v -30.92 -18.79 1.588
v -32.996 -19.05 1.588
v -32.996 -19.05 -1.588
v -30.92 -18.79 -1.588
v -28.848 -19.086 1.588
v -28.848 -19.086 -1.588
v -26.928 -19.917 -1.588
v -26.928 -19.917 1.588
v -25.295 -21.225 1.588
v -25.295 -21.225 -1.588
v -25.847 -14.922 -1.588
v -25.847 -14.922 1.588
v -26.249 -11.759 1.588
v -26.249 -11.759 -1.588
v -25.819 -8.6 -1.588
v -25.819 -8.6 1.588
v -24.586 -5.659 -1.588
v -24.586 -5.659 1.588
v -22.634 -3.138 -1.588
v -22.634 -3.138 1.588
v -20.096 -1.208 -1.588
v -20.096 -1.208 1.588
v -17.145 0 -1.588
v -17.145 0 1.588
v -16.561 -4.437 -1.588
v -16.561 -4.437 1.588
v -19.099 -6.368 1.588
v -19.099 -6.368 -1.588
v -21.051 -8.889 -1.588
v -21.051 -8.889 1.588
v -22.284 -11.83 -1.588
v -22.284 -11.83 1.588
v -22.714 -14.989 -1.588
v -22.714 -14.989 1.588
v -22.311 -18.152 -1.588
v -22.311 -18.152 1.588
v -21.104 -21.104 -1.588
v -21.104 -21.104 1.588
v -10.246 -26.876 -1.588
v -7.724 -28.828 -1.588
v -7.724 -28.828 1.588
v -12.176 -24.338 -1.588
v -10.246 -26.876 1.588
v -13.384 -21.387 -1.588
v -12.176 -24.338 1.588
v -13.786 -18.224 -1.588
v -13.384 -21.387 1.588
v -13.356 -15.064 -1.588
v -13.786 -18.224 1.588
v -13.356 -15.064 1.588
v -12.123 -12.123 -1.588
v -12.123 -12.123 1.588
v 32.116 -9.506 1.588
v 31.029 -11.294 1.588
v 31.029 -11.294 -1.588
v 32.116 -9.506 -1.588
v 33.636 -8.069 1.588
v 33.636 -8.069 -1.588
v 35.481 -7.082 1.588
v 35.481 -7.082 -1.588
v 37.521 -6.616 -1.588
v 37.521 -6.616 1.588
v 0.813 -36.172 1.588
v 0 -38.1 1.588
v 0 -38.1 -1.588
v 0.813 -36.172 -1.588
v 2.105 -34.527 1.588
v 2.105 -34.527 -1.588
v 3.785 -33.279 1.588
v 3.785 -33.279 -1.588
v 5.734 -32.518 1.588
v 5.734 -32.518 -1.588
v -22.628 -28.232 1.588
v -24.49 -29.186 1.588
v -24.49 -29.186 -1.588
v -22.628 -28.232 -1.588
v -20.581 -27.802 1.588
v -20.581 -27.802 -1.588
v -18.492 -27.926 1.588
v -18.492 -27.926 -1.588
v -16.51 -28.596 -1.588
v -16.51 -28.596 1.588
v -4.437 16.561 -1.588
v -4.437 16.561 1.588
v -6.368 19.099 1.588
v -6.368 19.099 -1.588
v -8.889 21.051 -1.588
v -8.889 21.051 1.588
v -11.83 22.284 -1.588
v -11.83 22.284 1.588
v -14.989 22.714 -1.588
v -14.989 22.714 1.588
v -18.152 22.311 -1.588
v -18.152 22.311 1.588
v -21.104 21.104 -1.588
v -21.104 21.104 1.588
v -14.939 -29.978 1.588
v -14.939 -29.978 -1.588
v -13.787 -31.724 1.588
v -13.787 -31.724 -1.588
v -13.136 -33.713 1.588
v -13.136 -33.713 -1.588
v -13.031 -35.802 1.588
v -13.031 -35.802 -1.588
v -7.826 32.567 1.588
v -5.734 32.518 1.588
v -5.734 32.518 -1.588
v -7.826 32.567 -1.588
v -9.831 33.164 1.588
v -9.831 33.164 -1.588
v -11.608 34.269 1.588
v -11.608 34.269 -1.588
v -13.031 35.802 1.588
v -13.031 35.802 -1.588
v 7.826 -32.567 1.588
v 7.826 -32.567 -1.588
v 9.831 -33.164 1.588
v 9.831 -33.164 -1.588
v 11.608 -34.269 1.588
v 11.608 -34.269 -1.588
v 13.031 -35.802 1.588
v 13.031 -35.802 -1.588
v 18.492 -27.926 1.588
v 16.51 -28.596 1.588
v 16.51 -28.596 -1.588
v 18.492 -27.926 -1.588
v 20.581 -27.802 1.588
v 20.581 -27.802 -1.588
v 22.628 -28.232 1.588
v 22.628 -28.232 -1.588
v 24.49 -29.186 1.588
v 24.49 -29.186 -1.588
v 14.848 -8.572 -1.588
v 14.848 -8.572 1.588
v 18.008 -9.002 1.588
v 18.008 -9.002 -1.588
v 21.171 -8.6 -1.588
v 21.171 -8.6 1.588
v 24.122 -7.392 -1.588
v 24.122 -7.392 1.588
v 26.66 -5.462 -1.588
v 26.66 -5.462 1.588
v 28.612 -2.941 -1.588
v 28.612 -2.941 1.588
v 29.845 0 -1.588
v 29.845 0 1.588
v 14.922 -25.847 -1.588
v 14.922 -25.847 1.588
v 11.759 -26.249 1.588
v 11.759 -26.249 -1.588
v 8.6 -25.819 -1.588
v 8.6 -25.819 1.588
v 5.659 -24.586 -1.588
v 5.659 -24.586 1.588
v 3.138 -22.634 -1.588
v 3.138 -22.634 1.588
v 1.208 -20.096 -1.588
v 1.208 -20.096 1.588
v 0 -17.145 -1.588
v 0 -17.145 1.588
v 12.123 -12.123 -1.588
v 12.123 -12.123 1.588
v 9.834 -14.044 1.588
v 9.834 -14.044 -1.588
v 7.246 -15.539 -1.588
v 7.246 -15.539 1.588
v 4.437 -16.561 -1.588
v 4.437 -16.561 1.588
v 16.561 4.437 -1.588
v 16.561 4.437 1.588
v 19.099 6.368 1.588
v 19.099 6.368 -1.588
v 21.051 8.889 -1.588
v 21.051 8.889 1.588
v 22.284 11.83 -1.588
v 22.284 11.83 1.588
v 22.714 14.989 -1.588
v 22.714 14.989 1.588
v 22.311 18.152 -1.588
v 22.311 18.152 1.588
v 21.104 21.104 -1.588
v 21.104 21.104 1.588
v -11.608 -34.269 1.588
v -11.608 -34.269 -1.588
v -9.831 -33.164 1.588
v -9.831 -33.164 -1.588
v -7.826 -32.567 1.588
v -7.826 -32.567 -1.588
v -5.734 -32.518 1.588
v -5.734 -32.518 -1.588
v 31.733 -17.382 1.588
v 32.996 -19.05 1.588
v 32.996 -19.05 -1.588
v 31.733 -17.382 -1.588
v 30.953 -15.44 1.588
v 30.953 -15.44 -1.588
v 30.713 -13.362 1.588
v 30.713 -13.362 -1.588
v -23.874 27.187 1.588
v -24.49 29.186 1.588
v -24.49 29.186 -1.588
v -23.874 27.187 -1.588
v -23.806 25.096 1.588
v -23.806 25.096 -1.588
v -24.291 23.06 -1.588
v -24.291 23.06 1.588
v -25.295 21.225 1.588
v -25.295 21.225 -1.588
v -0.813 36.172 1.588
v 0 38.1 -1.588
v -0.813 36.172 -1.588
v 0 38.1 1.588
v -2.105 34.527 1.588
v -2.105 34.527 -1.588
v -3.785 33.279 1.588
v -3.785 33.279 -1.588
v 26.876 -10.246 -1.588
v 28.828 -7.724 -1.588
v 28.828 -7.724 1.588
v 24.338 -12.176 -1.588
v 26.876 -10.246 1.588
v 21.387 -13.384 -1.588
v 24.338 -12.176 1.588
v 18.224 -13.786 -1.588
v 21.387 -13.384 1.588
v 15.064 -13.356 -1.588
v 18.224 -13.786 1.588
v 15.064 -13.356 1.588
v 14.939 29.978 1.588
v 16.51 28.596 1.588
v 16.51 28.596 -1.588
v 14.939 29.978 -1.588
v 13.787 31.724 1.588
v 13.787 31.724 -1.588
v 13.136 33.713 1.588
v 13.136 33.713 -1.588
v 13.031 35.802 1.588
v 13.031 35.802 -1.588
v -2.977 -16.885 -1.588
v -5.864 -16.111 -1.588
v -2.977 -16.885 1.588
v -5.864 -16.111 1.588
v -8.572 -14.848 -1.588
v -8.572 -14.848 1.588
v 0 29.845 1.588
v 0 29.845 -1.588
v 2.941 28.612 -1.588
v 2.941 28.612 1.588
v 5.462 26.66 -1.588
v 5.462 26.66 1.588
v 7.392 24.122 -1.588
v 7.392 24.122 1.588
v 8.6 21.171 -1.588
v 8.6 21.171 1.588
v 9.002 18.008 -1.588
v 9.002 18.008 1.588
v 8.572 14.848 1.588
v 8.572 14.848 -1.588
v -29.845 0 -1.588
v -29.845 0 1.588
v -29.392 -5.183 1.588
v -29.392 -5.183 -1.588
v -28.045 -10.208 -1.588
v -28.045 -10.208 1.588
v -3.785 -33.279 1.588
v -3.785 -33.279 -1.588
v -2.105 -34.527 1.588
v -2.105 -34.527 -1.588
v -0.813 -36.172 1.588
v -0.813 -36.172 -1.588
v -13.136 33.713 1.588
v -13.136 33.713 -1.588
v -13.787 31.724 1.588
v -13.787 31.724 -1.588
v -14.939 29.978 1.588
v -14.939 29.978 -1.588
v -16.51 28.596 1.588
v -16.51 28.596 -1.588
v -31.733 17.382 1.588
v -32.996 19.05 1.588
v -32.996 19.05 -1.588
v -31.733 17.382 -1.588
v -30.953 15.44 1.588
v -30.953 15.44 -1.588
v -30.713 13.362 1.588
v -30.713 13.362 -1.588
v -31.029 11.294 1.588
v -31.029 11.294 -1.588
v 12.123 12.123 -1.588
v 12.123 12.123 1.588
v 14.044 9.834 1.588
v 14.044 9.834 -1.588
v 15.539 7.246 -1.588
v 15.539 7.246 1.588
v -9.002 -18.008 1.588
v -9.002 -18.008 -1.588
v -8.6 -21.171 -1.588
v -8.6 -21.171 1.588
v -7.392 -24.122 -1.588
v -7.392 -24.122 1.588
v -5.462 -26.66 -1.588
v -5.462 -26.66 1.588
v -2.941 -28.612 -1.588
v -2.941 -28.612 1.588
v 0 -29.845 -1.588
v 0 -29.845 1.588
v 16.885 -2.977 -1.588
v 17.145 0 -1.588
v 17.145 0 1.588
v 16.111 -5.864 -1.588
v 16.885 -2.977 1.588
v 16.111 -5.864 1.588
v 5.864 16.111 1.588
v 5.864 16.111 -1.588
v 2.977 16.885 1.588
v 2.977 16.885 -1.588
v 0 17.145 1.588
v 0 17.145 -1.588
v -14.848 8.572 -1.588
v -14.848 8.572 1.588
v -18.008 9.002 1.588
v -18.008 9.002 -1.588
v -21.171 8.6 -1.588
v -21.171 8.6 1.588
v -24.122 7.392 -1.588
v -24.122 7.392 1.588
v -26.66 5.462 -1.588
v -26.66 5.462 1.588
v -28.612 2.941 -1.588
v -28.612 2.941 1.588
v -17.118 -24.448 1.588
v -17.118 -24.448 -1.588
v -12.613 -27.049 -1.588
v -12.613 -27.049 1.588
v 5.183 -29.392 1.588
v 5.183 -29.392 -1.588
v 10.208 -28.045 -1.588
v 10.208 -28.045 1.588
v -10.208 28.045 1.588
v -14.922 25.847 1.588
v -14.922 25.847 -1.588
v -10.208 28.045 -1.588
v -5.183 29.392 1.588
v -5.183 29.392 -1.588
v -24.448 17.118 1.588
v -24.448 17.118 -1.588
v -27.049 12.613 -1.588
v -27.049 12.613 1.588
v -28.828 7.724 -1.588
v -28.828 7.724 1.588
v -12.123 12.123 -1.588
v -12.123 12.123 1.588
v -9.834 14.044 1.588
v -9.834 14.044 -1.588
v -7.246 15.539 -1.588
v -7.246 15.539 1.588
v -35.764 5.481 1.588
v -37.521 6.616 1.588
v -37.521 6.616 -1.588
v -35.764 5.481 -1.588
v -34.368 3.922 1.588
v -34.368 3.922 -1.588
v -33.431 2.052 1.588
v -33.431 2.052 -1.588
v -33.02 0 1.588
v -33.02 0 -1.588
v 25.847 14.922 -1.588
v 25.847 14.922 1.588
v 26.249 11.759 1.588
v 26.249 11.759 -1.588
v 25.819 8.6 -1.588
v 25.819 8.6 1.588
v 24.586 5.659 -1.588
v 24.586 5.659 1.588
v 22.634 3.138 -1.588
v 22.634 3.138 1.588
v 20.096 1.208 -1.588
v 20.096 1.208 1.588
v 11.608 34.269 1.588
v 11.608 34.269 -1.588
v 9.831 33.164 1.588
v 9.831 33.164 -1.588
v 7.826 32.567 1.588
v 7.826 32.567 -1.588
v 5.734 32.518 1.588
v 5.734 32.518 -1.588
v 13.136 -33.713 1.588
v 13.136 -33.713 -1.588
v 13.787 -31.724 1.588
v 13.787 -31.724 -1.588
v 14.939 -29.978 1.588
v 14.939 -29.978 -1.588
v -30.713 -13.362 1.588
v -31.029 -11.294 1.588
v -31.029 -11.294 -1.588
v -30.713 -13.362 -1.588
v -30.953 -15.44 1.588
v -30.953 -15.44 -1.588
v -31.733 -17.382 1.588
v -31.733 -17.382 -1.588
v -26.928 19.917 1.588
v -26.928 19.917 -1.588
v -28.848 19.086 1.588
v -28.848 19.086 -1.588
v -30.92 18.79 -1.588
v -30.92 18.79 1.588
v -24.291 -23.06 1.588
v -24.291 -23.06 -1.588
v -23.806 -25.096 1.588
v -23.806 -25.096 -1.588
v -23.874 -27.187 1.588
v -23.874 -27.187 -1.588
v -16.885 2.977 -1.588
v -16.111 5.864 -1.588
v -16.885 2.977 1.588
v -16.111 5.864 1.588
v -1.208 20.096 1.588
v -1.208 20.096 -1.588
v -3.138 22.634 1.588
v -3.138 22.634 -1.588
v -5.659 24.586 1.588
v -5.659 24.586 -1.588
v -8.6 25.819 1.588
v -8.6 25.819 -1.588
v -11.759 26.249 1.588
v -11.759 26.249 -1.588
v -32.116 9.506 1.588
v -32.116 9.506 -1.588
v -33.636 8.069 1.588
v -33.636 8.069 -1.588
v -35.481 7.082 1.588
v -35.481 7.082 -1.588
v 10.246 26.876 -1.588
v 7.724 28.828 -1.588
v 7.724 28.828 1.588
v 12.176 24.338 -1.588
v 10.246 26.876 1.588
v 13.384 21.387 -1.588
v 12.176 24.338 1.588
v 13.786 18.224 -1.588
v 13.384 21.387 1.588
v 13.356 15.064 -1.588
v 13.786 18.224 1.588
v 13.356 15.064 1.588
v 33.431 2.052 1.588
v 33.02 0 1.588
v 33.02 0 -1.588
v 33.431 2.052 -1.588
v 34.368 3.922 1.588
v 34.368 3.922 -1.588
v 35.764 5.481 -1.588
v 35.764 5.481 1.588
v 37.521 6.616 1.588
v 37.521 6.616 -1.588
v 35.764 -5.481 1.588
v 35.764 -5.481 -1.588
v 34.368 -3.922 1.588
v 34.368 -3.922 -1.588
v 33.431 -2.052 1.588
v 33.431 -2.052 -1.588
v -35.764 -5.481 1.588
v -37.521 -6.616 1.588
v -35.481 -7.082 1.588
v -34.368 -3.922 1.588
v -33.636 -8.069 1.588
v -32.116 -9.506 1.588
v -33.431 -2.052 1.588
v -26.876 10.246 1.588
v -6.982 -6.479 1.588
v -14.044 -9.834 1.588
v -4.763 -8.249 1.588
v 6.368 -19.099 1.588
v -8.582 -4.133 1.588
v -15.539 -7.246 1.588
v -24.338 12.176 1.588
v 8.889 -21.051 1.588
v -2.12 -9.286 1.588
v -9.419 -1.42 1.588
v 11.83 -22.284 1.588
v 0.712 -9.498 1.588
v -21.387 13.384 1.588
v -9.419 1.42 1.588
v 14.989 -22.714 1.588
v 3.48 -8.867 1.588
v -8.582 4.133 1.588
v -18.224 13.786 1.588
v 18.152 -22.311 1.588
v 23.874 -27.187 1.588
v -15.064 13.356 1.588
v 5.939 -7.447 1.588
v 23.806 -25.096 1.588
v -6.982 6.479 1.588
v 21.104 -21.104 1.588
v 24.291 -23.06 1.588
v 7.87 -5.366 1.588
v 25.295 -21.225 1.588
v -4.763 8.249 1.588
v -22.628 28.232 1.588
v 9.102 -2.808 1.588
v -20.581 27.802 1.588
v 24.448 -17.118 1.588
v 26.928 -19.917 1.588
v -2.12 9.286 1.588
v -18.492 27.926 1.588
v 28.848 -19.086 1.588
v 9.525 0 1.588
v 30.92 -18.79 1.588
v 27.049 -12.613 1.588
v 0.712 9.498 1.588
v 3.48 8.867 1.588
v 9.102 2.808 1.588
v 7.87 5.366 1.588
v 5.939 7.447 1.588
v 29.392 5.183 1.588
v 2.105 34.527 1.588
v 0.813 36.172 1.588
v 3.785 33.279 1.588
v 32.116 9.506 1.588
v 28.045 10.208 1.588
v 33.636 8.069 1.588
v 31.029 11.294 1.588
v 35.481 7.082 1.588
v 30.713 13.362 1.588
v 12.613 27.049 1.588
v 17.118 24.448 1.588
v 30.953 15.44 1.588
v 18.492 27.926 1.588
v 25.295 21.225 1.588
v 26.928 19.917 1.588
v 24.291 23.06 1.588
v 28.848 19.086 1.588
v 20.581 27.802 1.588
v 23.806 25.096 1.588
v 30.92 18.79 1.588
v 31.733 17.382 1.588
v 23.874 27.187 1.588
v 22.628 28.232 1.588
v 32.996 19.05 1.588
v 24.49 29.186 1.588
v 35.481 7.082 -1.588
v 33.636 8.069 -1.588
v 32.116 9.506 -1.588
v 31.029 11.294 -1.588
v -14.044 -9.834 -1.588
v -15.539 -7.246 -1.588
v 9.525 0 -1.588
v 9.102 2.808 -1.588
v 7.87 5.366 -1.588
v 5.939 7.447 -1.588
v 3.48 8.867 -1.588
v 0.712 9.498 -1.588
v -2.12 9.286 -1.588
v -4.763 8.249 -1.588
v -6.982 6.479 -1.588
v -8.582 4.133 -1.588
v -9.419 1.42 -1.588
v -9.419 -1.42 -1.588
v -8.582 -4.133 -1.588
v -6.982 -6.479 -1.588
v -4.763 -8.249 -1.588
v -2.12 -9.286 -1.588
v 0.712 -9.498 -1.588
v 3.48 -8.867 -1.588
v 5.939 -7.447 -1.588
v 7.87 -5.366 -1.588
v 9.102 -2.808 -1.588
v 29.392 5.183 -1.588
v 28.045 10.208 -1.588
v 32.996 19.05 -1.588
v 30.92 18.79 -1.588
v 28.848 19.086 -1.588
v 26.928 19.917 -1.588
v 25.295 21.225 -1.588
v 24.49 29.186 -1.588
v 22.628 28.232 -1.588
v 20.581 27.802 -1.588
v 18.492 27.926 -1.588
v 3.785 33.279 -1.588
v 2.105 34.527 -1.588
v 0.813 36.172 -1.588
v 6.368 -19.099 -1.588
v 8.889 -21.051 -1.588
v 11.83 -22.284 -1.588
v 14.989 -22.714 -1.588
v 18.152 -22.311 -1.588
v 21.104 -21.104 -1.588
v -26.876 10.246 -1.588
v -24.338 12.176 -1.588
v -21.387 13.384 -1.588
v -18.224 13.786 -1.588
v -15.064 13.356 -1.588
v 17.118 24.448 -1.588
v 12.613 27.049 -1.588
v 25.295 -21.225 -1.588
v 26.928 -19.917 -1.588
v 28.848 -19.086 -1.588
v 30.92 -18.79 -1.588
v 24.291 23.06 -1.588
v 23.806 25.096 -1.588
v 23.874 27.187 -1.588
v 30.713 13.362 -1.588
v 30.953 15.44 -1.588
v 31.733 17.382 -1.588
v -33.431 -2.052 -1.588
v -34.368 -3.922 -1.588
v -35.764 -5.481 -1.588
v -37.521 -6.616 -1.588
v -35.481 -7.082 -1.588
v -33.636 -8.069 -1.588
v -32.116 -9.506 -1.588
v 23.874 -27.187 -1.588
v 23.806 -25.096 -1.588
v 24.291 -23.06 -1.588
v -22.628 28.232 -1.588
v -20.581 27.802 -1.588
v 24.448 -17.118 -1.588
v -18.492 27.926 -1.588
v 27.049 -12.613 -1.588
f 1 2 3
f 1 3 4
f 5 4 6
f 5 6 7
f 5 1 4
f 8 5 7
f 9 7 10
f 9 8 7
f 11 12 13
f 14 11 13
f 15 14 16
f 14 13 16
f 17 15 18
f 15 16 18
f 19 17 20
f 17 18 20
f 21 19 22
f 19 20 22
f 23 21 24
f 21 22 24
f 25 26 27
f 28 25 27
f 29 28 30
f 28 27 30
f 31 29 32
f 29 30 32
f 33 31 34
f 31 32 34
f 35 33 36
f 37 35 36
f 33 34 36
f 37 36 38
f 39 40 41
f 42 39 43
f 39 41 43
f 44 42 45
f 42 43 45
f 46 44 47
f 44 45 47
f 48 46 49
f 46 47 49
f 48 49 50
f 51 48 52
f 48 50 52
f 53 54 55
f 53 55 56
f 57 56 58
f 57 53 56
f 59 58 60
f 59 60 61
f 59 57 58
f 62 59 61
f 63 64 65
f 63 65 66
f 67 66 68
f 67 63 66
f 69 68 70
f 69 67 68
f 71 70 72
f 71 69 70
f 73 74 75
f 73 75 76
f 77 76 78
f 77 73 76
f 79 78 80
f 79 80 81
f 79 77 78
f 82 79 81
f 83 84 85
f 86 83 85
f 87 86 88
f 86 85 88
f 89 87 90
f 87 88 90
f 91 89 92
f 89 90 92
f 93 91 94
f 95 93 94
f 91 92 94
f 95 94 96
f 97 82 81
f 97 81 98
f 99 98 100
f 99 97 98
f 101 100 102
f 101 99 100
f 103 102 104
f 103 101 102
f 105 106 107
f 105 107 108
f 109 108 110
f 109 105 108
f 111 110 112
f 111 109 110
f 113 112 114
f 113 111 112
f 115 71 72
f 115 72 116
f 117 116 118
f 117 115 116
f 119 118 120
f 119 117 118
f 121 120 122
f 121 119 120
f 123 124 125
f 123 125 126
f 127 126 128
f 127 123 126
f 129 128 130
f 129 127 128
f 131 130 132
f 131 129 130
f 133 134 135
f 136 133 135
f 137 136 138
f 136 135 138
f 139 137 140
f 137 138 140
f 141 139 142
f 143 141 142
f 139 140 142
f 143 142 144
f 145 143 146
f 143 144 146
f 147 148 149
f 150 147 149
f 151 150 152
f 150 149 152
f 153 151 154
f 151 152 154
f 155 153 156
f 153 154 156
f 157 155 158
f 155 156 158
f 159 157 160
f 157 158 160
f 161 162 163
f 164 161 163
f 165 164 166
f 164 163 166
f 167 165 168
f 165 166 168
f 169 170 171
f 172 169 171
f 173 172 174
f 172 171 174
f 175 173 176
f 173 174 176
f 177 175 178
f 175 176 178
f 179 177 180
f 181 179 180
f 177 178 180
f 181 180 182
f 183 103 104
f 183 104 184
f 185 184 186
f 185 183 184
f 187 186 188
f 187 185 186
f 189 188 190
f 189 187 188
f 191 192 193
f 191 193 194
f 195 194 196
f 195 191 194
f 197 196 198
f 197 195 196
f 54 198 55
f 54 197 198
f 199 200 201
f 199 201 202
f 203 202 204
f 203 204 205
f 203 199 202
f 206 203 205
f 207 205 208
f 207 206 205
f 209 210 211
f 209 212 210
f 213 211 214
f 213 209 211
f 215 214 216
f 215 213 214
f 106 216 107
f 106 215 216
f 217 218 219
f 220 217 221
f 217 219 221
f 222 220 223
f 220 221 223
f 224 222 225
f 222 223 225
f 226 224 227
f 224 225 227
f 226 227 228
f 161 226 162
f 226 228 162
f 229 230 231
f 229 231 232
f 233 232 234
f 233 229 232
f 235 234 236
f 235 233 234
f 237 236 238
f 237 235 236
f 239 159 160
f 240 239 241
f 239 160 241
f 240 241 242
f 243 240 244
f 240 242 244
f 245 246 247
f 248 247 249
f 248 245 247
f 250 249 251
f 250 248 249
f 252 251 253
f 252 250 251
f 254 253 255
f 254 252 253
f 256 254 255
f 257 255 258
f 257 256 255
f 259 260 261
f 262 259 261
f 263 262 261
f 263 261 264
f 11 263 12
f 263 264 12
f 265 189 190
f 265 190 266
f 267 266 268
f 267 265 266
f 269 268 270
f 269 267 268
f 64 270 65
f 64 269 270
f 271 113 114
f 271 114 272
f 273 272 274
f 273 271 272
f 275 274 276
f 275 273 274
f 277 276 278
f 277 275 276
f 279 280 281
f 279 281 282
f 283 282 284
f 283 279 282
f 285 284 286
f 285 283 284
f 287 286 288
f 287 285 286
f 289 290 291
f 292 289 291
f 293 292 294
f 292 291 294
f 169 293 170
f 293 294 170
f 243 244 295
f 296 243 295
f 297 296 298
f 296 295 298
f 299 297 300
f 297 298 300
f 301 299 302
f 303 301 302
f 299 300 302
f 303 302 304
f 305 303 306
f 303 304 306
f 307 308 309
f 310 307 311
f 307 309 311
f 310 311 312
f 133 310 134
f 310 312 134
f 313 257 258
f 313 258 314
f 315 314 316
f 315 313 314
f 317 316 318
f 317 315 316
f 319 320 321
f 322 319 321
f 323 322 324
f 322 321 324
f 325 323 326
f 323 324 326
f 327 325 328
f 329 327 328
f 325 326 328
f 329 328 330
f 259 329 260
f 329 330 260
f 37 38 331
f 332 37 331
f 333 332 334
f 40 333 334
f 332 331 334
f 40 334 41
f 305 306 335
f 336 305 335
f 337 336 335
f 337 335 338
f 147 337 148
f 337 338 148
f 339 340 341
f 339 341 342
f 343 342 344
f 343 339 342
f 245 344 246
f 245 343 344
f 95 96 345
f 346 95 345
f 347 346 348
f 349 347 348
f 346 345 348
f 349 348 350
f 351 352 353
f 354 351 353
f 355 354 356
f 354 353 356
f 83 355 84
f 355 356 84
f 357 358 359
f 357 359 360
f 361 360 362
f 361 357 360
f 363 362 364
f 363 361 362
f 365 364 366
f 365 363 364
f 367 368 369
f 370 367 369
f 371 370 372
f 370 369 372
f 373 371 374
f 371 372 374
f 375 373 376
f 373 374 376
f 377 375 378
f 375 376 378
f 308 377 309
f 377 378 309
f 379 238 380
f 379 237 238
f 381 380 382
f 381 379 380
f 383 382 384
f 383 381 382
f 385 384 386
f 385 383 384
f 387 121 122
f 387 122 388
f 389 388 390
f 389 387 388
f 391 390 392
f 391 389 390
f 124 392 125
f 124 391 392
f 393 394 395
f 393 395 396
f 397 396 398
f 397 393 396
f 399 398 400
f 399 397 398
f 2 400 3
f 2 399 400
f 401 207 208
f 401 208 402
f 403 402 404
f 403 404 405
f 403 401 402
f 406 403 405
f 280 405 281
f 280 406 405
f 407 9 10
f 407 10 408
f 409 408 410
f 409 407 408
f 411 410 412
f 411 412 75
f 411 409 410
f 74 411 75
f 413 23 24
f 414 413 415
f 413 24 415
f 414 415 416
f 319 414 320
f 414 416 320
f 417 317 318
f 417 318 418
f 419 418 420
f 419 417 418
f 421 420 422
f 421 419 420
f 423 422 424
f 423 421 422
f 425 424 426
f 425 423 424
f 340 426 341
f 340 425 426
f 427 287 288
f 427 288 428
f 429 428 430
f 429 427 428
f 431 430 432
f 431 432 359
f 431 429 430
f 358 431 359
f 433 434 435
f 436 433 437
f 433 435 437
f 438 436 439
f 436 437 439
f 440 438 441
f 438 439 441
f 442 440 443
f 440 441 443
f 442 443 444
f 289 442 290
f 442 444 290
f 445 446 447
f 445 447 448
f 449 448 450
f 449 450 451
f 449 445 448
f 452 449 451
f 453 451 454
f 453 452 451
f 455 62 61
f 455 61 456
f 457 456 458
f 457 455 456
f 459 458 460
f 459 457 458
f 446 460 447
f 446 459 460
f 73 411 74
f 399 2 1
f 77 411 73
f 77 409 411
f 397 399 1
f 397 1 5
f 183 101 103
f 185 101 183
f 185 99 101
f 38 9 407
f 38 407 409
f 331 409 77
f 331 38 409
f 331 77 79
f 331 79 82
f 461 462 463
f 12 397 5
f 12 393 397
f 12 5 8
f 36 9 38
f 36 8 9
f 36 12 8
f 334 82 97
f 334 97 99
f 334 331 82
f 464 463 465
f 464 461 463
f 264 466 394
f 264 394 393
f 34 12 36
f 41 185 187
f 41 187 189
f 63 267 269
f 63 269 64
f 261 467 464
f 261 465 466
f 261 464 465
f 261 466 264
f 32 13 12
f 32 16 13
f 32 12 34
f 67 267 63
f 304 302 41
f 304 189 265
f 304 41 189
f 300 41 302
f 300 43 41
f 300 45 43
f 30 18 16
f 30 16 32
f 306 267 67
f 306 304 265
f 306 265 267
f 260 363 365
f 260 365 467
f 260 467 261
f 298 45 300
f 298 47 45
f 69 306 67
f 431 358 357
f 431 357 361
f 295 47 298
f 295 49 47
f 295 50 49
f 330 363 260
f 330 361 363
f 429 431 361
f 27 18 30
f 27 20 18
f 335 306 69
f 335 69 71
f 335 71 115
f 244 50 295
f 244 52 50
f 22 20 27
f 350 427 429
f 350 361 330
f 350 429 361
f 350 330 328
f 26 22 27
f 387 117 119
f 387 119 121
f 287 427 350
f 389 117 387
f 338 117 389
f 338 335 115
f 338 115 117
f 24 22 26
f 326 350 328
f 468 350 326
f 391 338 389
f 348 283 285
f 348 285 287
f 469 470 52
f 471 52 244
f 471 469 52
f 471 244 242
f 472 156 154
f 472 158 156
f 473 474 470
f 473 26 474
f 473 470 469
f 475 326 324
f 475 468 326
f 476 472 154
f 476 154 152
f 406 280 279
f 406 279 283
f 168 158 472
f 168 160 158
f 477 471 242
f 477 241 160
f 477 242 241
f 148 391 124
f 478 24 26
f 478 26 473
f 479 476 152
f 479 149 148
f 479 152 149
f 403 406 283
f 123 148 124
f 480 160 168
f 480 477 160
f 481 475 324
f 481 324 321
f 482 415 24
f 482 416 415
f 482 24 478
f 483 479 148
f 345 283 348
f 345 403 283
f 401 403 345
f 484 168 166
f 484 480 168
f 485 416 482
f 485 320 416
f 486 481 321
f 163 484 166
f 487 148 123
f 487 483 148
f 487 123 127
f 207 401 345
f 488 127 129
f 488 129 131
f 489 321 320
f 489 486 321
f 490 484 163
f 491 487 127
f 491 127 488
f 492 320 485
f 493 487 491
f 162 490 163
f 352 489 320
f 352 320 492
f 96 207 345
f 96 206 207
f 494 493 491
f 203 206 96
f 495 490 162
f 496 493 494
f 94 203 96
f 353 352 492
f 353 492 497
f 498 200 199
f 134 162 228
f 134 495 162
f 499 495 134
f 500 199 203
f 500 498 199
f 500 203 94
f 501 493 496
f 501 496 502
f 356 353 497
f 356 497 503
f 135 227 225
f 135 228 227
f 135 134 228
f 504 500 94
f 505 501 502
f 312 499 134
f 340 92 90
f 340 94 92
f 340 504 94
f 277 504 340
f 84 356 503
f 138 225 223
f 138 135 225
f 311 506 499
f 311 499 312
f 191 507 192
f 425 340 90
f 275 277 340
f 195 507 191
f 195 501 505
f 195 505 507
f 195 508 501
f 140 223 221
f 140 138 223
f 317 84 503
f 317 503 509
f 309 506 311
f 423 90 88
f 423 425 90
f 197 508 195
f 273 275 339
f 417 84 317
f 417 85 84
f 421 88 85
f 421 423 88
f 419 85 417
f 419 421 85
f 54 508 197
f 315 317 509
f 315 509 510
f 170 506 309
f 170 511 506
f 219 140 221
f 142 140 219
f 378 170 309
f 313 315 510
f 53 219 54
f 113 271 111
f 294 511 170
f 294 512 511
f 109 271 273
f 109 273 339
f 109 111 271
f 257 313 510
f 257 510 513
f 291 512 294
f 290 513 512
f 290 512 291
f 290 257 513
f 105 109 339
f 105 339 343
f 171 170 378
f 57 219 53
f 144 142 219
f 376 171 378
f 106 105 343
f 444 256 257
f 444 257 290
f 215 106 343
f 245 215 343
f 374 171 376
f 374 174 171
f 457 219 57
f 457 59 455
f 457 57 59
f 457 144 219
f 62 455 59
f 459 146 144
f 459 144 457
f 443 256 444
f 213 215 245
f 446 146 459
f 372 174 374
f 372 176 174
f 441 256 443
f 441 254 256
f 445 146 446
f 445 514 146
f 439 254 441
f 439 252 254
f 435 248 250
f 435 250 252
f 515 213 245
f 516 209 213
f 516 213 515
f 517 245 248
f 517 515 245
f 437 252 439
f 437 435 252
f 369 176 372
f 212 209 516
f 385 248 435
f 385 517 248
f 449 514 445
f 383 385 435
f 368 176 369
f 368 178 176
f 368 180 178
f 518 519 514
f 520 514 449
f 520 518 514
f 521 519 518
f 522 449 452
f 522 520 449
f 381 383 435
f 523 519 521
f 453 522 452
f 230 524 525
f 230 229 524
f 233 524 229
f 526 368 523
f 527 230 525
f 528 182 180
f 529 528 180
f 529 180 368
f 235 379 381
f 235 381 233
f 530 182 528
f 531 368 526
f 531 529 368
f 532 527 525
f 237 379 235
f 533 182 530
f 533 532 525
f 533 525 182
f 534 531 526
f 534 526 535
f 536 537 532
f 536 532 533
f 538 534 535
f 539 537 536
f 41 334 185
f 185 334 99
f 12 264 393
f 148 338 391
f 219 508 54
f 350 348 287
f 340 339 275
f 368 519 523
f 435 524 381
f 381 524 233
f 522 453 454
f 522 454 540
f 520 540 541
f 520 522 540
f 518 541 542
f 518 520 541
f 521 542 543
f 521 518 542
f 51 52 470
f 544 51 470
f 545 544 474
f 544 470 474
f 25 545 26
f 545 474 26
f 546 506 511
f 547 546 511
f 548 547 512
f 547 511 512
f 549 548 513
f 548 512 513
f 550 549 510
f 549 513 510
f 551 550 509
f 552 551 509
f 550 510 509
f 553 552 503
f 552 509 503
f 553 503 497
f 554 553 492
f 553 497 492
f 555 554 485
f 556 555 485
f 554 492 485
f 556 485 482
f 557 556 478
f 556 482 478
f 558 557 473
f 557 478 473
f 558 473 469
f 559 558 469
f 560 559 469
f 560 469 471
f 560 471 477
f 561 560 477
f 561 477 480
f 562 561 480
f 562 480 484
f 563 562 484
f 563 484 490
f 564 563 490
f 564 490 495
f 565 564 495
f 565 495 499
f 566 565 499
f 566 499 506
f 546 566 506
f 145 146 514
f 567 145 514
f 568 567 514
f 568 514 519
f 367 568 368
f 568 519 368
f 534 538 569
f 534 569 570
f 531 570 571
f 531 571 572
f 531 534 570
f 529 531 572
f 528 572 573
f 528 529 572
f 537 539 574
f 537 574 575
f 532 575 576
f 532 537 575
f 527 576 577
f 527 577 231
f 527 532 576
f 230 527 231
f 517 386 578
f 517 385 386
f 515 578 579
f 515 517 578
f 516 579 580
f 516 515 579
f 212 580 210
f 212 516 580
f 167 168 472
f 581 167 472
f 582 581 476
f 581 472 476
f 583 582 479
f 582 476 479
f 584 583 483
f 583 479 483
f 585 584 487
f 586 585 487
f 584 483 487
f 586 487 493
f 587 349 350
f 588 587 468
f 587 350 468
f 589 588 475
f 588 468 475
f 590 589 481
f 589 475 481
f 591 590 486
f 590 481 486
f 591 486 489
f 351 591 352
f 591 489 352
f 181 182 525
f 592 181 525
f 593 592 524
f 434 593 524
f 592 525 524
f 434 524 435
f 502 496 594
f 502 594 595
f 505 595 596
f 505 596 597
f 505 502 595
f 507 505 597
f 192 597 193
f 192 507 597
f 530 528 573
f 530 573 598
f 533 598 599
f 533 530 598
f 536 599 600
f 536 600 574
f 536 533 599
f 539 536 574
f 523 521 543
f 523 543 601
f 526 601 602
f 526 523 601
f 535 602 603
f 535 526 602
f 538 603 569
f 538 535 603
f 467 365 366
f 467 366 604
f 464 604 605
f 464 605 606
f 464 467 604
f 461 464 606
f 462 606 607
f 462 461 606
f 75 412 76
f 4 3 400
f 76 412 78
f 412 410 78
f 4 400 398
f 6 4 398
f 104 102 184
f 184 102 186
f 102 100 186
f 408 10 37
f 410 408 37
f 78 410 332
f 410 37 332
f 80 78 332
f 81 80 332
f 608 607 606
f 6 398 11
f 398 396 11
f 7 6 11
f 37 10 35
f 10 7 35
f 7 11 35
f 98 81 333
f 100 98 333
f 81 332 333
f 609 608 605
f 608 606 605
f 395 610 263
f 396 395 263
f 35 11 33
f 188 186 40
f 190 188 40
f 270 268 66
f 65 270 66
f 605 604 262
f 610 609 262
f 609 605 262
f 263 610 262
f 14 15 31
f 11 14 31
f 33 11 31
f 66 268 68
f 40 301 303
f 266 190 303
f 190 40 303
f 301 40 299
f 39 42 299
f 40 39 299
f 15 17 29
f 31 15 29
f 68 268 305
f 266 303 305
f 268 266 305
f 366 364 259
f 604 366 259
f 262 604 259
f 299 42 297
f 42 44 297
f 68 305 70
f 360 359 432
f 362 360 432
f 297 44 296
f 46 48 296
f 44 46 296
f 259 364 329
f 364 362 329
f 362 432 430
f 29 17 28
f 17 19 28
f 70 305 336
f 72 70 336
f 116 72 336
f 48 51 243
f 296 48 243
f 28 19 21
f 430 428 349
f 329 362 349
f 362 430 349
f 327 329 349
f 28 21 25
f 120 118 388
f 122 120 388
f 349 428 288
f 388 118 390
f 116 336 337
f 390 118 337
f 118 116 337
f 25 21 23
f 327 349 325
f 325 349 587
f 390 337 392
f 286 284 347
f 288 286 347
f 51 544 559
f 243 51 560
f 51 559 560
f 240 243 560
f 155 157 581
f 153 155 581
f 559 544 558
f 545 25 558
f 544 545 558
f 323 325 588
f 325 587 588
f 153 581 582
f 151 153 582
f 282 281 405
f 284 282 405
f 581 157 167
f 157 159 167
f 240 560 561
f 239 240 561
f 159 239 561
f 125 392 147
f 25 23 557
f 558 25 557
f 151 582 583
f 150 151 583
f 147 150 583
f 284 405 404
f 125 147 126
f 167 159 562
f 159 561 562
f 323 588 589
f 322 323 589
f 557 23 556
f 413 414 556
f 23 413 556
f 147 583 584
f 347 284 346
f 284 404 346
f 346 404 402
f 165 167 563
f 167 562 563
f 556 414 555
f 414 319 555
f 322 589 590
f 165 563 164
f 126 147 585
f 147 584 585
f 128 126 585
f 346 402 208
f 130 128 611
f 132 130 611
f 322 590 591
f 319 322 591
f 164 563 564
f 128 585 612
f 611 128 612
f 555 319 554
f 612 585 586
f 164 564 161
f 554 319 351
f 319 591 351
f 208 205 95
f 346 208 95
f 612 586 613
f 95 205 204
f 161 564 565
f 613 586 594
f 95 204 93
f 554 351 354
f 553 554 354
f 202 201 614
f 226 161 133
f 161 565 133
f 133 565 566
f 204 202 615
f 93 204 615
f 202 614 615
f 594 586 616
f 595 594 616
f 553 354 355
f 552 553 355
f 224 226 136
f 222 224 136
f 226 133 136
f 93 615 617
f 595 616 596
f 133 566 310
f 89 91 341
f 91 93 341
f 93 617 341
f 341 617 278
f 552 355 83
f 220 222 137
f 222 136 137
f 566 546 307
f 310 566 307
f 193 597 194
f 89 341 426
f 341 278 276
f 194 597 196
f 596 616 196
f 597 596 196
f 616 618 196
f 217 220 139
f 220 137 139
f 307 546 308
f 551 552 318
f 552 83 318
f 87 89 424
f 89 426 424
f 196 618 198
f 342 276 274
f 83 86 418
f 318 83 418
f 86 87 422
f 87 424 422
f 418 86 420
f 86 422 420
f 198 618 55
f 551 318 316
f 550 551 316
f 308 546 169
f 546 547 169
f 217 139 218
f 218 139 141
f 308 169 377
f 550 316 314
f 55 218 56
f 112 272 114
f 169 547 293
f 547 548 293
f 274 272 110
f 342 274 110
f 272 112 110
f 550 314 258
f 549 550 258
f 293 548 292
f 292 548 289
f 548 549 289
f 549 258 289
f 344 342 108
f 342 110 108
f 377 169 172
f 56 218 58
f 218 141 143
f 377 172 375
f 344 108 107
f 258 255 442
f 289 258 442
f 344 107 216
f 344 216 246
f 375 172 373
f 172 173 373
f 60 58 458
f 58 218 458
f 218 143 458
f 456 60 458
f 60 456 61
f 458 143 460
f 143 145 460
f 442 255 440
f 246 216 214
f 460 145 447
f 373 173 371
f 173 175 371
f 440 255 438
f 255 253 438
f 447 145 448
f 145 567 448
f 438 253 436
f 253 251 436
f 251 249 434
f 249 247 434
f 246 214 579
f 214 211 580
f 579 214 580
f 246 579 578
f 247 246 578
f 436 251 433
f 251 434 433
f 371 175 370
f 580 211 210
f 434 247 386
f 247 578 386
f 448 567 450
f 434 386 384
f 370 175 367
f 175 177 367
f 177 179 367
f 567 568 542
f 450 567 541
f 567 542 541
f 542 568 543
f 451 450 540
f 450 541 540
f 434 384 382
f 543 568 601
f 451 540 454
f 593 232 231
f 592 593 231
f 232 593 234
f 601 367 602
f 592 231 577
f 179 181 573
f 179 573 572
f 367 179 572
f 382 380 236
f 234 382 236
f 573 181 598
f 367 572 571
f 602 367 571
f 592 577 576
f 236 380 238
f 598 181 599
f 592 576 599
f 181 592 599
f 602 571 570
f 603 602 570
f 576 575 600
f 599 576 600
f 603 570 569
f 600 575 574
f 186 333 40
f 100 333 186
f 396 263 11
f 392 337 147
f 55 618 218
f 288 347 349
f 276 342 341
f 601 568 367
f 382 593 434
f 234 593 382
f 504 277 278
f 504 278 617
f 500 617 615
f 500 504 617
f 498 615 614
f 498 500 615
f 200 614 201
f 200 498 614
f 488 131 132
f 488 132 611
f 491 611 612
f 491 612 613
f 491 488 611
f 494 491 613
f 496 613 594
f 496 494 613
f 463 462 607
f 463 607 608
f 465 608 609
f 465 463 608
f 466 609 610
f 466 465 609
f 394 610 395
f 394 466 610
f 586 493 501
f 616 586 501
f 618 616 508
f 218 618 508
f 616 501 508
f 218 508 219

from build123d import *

# Parameters (mm, degrees)
SALIENTE_EXTRUIR1_DEPTH = 1.5875
CROQUIS2_R              = 9.525
CORTAR_EXTRUIR1_DEPTH   = 4.175


with BuildPart() as part:
    # Croquis1 → Saliente-Extruir1 (new body, symmetric)
    with BuildSketch(Plane.XY):
        with BuildLine():
            ThreePointArc((0, 38.1), (-2.105039418, 34.526506764), (-5.733862827, 32.518352004))
            ThreePointArc((-5.733862827, 32.518352004), (-9.830670784, 33.164269511), (-13.030967461, 35.802288852))
            ThreePointArc((-13.030967461, 35.802288852), (-13.7868508, 31.724337744), (-16.51, 28.596158833))
            ThreePointArc((-16.51, 28.596158833), (-20.580657004, 27.801931903), (-24.490207929, 29.186293283))
            ThreePointArc((-24.490207929, 29.186293283), (-23.805764502, 25.09574539), (-25.294787512, 21.224846872))
            ThreePointArc((-25.294787512, 21.224846872), (-28.848312252, 19.086270994), (-32.995567884, 19.05))
            ThreePointArc((-32.995567884, 19.05), (-30.95335167, 15.440235769), (-31.028650338, 11.293505133))
            ThreePointArc((-31.028650338, 11.293505133), (-33.636435286, 8.06852412), (-37.52117539, 6.615995569))
            ThreePointArc((-37.52117539, 6.615995569), (-34.367507804, 3.922405841), (-33.02, 0))
            ThreePointArc((-33.02, 0), (-34.367507804, -3.922405841), (-37.52117539, -6.615995569))
            ThreePointArc((-37.52117539, -6.615995569), (-33.636435286, -8.06852412), (-31.028650338, -11.293505133))
            ThreePointArc((-31.028650338, -11.293505133), (-30.95335167, -15.440235769), (-32.995567884, -19.05))
            ThreePointArc((-32.995567884, -19.05), (-28.848312252, -19.086270994), (-25.294787512, -21.224846872))
            ThreePointArc((-25.294787512, -21.224846872), (-23.805764502, -25.09574539), (-24.490207929, -29.186293283))
            ThreePointArc((-24.490207929, -29.186293283), (-20.580657004, -27.801931903), (-16.51, -28.596158833))
            ThreePointArc((-16.51, -28.596158833), (-13.7868508, -31.724337744), (-13.030967461, -35.802288852))
            ThreePointArc((-13.030967461, -35.802288852), (-9.830670784, -33.164269511), (-5.733862827, -32.518352004))
            ThreePointArc((-5.733862827, -32.518352004), (-2.105039418, -34.526506764), (0, -38.1))
            ThreePointArc((0, -38.1), (2.105039418, -34.526506764), (5.733862827, -32.518352004))
            ThreePointArc((5.733862827, -32.518352004), (9.830670784, -33.164269511), (13.030967461, -35.802288852))
            ThreePointArc((13.030967461, -35.802288852), (13.7868508, -31.724337744), (16.51, -28.596158833))
            ThreePointArc((16.51, -28.596158833), (20.580657004, -27.801931903), (24.490207929, -29.186293283))
            ThreePointArc((24.490207929, -29.186293283), (23.805764502, -25.09574539), (25.294787512, -21.224846872))
            ThreePointArc((25.294787512, -21.224846872), (28.848312252, -19.086270994), (32.995567884, -19.05))
            ThreePointArc((32.995567884, -19.05), (30.95335167, -15.440235769), (31.028650338, -11.293505133))
            ThreePointArc((31.028650338, -11.293505133), (33.636435286, -8.06852412), (37.52117539, -6.615995569))
            ThreePointArc((37.52117539, -6.615995569), (34.367507804, -3.922405841), (33.02, 0))
            ThreePointArc((33.02, 0), (34.367507804, 3.922405841), (37.52117539, 6.615995569))
            ThreePointArc((37.52117539, 6.615995569), (33.636435286, 8.06852412), (31.028650338, 11.293505133))
            ThreePointArc((31.028650338, 11.293505133), (30.95335167, 15.440235769), (32.995567884, 19.05))
            ThreePointArc((32.995567884, 19.05), (28.848312252, 19.086270994), (25.294787512, 21.224846872))
            ThreePointArc((25.294787512, 21.224846872), (23.805764502, 25.09574539), (24.490207929, 29.186293283))
            ThreePointArc((24.490207929, 29.186293283), (20.580657004, 27.801931903), (16.51, 28.596158833))
            ThreePointArc((16.51, 28.596158833), (13.7868508, 31.724337744), (13.030967461, 35.802288852))
            ThreePointArc((13.030967461, 35.802288852), (9.830670784, 33.164269511), (5.733862827, 32.518352004))
            ThreePointArc((5.733862827, 32.518352004), (2.105039418, 34.526506764), (0, 38.1))
        make_face()
    extrude(amount=SALIENTE_EXTRUIR1_DEPTH, both=True)

    # Croquis2 → Cortar-Extruir1 (cut, through all)
    with BuildSketch(Plane.XY.offset(1.5875)):
        Circle(CROQUIS2_R)
        with BuildLine():
            ThreePointArc((8.5725, 14.848005548), (4.437452528, 16.560798292), (0, 17.145))
            ThreePointArc((0, 17.145), (-5.659104508, 24.58631503), (-14.9225, 25.846528176))
            ThreePointArc((-14.9225, 25.846528176), (-7.724454401, 28.828056286), (0, 29.845))
            ThreePointArc((0, 29.845), (7.392229248, 24.121925656), (8.5725, 14.848005548))
        make_face()
        with BuildLine():
            ThreePointArc((21.103601885, 21.103601885), (14.9225, 25.846528176), (7.724454401, 28.828056286))
            ThreePointArc((7.724454401, 28.828056286), (13.383558909, 21.386741255), (12.123345763, 12.123345763))
            ThreePointArc((12.123345763, 12.123345763), (14.848005548, 8.5725), (16.560798292, 4.437452528))
            ThreePointArc((16.560798292, 4.437452528), (22.283872636, 11.829681777), (21.103601885, 21.103601885))
        make_face()
        with BuildLine():
            ThreePointArc((29.845, 0), (28.828056286, 7.724454401), (25.846528176, 14.9225))
            ThreePointArc((25.846528176, 14.9225), (24.58631503, 5.659104508), (17.145, 0))
            ThreePointArc((17.145, 0), (16.560798292, -4.437452528), (14.848005548, -8.5725))
            ThreePointArc((14.848005548, -8.5725), (24.121925656, -7.392229248), (29.845, 0))
        make_face()
        with BuildLine():
            ThreePointArc((21.103601885, -21.103601885), (25.846528176, -14.9225), (28.828056286, -7.724454401))
            ThreePointArc((28.828056286, -7.724454401), (21.386741255, -13.383558909), (12.123345763, -12.123345763))
            ThreePointArc((12.123345763, -12.123345763), (8.5725, -14.848005548), (4.437452528, -16.560798292))
            ThreePointArc((4.437452528, -16.560798292), (11.829681777, -22.283872636), (21.103601885, -21.103601885))
        make_face()
        with BuildLine():
            ThreePointArc((0, -29.845), (7.724454401, -28.828056286), (14.9225, -25.846528176))
            ThreePointArc((14.9225, -25.846528176), (5.659104508, -24.58631503), (0, -17.145))
            ThreePointArc((0, -17.145), (-4.437452528, -16.560798292), (-8.5725, -14.848005548))
            ThreePointArc((-8.5725, -14.848005548), (-7.392229248, -24.121925656), (0, -29.845))
        make_face()
        with BuildLine():
            ThreePointArc((-21.103601885, -21.103601885), (-14.9225, -25.846528176), (-7.724454401, -28.828056286))
            ThreePointArc((-7.724454401, -28.828056286), (-13.383558909, -21.386741255), (-12.123345763, -12.123345763))
            ThreePointArc((-12.123345763, -12.123345763), (-14.848005548, -8.5725), (-16.560798292, -4.437452528))
            ThreePointArc((-16.560798292, -4.437452528), (-22.283872636, -11.829681777), (-21.103601885, -21.103601885))
        make_face()
        with BuildLine():
            ThreePointArc((-29.845, 0), (-28.828056286, -7.724454401), (-25.846528176, -14.9225))
            ThreePointArc((-25.846528176, -14.9225), (-24.58631503, -5.659104508), (-17.145, 0))
            ThreePointArc((-17.145, 0), (-16.560798292, 4.437452528), (-14.848005548, 8.5725))
            ThreePointArc((-14.848005548, 8.5725), (-24.121925656, 7.392229248), (-29.845, 0))
        make_face()
        with BuildLine():
            ThreePointArc((-21.103601885, 21.103601885), (-25.846528176, 14.9225), (-28.828056286, 7.724454401))
            ThreePointArc((-28.828056286, 7.724454401), (-21.386741255, 13.383558909), (-12.123345763, 12.123345763))
            ThreePointArc((-12.123345763, 12.123345763), (-8.5725, 14.848005548), (-4.437452528, 16.560798292))
            ThreePointArc((-4.437452528, 16.560798292), (-11.829681777, 22.283872636), (-21.103601885, 21.103601885))
        make_face()
    extrude(amount=-CORTAR_EXTRUIR1_DEPTH, mode=Mode.SUBTRACT)


solid = part.part
